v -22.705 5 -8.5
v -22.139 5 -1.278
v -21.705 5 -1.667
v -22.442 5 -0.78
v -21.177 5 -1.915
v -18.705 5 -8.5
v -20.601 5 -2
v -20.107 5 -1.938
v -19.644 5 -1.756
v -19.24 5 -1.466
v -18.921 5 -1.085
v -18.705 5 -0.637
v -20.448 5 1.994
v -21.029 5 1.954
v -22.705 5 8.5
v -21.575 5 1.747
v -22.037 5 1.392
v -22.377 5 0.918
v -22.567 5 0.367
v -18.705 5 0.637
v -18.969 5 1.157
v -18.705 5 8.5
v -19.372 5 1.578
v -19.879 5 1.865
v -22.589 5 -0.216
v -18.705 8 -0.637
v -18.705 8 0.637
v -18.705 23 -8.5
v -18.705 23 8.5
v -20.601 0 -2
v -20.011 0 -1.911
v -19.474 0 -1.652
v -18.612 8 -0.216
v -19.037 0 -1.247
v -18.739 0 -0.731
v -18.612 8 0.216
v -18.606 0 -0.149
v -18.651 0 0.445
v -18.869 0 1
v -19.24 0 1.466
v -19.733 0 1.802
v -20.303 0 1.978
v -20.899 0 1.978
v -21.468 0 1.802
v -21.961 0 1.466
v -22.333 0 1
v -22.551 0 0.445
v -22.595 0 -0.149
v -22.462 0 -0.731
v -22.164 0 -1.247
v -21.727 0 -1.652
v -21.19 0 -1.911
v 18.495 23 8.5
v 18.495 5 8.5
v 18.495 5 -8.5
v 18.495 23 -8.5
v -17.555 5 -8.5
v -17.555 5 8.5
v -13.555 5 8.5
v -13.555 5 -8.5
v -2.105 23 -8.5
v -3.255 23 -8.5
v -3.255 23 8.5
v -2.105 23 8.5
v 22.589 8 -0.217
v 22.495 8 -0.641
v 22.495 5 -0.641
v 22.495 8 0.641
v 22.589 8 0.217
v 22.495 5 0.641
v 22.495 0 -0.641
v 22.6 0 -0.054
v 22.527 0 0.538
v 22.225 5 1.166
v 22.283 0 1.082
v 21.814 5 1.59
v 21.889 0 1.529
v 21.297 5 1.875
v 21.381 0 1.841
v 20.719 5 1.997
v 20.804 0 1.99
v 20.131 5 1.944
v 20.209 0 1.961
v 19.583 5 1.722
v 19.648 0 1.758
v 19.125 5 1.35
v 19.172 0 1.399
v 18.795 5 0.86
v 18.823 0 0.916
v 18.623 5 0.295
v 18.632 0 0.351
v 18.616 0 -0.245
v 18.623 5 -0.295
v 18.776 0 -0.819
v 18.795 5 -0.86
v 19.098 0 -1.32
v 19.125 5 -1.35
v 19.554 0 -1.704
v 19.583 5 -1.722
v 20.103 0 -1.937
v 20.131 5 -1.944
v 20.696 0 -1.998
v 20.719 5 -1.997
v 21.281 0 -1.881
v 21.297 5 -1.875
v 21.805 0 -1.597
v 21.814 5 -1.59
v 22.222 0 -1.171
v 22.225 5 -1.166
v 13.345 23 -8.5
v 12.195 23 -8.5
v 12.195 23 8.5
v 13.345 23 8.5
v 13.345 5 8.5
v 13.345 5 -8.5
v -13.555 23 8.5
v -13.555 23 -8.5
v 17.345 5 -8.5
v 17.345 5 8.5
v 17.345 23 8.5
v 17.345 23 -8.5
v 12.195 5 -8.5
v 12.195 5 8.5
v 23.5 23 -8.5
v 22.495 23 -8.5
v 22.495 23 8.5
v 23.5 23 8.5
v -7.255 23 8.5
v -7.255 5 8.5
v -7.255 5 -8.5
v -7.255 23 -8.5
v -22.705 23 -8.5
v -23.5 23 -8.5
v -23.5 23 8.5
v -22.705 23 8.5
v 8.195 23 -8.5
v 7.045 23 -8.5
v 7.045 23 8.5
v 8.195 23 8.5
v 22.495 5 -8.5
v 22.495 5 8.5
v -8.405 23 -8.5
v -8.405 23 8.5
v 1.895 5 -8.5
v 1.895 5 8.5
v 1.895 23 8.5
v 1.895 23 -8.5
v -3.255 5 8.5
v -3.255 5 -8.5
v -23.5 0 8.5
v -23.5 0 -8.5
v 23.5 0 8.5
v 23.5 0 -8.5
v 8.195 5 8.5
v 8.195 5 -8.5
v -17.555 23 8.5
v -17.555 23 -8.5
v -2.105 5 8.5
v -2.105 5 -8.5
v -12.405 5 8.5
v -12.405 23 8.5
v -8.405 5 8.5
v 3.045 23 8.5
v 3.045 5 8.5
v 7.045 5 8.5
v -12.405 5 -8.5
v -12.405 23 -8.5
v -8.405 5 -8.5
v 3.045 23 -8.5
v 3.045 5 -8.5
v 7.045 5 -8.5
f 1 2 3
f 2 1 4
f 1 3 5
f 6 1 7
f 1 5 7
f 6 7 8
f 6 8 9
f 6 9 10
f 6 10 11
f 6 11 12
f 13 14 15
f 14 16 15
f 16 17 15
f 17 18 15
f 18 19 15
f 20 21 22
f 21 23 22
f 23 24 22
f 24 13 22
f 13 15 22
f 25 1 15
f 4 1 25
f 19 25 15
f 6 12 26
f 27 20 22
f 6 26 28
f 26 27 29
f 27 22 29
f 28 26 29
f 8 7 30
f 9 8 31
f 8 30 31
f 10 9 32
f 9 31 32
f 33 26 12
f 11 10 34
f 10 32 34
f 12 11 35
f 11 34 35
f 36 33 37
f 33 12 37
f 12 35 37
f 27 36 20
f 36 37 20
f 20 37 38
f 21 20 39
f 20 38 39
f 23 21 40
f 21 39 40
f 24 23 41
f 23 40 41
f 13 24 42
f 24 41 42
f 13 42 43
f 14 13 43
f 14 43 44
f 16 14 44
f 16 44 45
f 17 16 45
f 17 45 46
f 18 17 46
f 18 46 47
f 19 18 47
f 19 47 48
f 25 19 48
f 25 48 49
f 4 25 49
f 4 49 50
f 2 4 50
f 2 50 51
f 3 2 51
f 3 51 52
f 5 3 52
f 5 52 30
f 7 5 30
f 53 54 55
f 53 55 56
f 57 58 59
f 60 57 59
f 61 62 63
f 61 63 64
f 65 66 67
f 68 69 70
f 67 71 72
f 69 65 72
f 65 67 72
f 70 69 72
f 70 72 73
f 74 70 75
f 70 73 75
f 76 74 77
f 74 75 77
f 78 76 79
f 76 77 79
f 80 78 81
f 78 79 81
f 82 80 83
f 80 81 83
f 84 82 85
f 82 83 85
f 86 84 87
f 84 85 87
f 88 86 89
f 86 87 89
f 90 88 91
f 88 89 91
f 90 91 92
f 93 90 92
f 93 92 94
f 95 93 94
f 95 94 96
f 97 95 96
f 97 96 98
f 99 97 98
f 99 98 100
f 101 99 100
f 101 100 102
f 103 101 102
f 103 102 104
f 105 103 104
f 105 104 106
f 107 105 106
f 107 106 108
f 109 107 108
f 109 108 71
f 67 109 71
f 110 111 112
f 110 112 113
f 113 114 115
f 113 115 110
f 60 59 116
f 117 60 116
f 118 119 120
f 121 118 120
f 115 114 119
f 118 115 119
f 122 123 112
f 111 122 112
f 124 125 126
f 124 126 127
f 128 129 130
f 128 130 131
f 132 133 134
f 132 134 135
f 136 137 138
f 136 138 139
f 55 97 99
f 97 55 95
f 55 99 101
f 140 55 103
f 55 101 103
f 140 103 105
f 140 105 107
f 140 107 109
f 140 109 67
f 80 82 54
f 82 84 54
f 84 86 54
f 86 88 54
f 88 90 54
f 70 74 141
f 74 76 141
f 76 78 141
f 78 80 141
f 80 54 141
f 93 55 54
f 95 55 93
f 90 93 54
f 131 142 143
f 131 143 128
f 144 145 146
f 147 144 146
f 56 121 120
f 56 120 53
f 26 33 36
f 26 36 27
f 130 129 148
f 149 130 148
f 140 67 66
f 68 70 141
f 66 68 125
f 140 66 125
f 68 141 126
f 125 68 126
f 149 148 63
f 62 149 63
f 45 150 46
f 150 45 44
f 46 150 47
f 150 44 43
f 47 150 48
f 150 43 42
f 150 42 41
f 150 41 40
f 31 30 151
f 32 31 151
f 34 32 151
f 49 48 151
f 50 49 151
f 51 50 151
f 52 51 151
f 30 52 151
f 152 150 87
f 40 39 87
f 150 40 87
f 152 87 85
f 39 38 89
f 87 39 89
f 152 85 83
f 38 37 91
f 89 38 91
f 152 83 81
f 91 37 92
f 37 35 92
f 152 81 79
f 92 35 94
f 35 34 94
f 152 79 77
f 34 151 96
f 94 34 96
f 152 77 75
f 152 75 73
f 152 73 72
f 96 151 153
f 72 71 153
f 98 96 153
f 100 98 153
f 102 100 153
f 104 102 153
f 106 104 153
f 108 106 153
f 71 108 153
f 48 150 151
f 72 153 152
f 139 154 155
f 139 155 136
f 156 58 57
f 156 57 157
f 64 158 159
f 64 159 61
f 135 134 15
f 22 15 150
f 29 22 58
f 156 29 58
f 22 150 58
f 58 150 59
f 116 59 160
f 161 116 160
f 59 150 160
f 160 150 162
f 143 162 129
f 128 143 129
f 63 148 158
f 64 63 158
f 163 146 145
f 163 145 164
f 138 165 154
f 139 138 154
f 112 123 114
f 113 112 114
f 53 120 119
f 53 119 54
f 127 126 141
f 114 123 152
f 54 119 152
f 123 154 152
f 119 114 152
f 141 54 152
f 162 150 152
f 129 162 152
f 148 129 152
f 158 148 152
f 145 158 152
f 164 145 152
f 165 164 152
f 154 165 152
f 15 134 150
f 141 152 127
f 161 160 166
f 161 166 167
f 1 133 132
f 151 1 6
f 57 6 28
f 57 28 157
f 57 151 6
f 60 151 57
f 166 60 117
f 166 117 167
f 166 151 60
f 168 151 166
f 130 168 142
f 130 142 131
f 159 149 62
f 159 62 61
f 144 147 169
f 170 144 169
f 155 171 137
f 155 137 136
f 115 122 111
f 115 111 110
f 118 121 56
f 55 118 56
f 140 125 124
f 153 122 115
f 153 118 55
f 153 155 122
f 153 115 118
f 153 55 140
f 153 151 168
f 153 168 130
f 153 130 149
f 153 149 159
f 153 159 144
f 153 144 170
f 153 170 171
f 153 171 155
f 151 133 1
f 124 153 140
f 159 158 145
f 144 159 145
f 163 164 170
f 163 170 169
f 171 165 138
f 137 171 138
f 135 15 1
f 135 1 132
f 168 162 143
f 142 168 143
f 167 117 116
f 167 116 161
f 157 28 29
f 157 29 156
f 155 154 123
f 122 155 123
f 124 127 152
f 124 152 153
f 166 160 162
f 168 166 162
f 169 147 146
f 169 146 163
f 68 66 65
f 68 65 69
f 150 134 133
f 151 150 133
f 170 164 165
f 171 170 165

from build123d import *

# Parameters (mm, degrees)
SKETCH1_W           = 47
SKETCH1_H           = 17
BOSS_EXTRUDE1_DEPTH = 23
SKETCH2_W           = 4
SKETCH2_H           = 18
CUT_EXTRUDE1_DEPTH  = 38.016888038
SKETCH3_R           = 2
CUT_EXTRUDE2_DEPTH  = 8


with BuildPart() as part:
    # Sketch1 → Boss-Extrude1 (new body)
    with BuildSketch(Plane(origin=(0, 0, 0), x_dir=(1, 0, 0), z_dir=(0, 1, 0))):
        Rectangle(SKETCH1_W, SKETCH1_H)
    extrude(amount=BOSS_EXTRUDE1_DEPTH)

    # Sketch2 → Cut-Extrude1 (cut, through all)
    with BuildSketch(Plane.XY.offset(8.5)):
        with Locations((-20.70480001, 14)):
            Rectangle(SKETCH2_W, SKETCH2_H)
        with Locations((-15.55480001, 14)):
            Rectangle(SKETCH2_W, SKETCH2_H)
        with Locations((-10.40480001, 14)):
            Rectangle(SKETCH2_W, SKETCH2_H)
        with Locations((-5.25480001, 14)):
            Rectangle(SKETCH2_W, SKETCH2_H)
        with Locations((-0.10480001, 14)):
            Rectangle(SKETCH2_W, SKETCH2_H)
        with Locations((5.04519999, 14)):
            Rectangle(SKETCH2_W, SKETCH2_H)
        with Locations((10.19519999, 14)):
            Rectangle(SKETCH2_W, SKETCH2_H)
        with Locations((15.34519999, 14)):
            Rectangle(SKETCH2_W, SKETCH2_H)
        with Locations((20.49519999, 14)):
            Rectangle(SKETCH2_W, SKETCH2_H)
    extrude(amount=-CUT_EXTRUDE1_DEPTH, mode=Mode.SUBTRACT)

    # Sketch3 → Cut-Extrude2 (cut)
    with BuildSketch(Plane.XZ):
        with Locations(Location((-20.600691388, 0, 0), (0, 0, 270))):
            Circle(SKETCH3_R)
        with Locations(Location((20.600691388, 0, 0), (0, 0, 341.307868808))):
            Circle(SKETCH3_R)
    extrude(amount=-CUT_EXTRUDE2_DEPTH, mode=Mode.SUBTRACT)


solid = part.part
